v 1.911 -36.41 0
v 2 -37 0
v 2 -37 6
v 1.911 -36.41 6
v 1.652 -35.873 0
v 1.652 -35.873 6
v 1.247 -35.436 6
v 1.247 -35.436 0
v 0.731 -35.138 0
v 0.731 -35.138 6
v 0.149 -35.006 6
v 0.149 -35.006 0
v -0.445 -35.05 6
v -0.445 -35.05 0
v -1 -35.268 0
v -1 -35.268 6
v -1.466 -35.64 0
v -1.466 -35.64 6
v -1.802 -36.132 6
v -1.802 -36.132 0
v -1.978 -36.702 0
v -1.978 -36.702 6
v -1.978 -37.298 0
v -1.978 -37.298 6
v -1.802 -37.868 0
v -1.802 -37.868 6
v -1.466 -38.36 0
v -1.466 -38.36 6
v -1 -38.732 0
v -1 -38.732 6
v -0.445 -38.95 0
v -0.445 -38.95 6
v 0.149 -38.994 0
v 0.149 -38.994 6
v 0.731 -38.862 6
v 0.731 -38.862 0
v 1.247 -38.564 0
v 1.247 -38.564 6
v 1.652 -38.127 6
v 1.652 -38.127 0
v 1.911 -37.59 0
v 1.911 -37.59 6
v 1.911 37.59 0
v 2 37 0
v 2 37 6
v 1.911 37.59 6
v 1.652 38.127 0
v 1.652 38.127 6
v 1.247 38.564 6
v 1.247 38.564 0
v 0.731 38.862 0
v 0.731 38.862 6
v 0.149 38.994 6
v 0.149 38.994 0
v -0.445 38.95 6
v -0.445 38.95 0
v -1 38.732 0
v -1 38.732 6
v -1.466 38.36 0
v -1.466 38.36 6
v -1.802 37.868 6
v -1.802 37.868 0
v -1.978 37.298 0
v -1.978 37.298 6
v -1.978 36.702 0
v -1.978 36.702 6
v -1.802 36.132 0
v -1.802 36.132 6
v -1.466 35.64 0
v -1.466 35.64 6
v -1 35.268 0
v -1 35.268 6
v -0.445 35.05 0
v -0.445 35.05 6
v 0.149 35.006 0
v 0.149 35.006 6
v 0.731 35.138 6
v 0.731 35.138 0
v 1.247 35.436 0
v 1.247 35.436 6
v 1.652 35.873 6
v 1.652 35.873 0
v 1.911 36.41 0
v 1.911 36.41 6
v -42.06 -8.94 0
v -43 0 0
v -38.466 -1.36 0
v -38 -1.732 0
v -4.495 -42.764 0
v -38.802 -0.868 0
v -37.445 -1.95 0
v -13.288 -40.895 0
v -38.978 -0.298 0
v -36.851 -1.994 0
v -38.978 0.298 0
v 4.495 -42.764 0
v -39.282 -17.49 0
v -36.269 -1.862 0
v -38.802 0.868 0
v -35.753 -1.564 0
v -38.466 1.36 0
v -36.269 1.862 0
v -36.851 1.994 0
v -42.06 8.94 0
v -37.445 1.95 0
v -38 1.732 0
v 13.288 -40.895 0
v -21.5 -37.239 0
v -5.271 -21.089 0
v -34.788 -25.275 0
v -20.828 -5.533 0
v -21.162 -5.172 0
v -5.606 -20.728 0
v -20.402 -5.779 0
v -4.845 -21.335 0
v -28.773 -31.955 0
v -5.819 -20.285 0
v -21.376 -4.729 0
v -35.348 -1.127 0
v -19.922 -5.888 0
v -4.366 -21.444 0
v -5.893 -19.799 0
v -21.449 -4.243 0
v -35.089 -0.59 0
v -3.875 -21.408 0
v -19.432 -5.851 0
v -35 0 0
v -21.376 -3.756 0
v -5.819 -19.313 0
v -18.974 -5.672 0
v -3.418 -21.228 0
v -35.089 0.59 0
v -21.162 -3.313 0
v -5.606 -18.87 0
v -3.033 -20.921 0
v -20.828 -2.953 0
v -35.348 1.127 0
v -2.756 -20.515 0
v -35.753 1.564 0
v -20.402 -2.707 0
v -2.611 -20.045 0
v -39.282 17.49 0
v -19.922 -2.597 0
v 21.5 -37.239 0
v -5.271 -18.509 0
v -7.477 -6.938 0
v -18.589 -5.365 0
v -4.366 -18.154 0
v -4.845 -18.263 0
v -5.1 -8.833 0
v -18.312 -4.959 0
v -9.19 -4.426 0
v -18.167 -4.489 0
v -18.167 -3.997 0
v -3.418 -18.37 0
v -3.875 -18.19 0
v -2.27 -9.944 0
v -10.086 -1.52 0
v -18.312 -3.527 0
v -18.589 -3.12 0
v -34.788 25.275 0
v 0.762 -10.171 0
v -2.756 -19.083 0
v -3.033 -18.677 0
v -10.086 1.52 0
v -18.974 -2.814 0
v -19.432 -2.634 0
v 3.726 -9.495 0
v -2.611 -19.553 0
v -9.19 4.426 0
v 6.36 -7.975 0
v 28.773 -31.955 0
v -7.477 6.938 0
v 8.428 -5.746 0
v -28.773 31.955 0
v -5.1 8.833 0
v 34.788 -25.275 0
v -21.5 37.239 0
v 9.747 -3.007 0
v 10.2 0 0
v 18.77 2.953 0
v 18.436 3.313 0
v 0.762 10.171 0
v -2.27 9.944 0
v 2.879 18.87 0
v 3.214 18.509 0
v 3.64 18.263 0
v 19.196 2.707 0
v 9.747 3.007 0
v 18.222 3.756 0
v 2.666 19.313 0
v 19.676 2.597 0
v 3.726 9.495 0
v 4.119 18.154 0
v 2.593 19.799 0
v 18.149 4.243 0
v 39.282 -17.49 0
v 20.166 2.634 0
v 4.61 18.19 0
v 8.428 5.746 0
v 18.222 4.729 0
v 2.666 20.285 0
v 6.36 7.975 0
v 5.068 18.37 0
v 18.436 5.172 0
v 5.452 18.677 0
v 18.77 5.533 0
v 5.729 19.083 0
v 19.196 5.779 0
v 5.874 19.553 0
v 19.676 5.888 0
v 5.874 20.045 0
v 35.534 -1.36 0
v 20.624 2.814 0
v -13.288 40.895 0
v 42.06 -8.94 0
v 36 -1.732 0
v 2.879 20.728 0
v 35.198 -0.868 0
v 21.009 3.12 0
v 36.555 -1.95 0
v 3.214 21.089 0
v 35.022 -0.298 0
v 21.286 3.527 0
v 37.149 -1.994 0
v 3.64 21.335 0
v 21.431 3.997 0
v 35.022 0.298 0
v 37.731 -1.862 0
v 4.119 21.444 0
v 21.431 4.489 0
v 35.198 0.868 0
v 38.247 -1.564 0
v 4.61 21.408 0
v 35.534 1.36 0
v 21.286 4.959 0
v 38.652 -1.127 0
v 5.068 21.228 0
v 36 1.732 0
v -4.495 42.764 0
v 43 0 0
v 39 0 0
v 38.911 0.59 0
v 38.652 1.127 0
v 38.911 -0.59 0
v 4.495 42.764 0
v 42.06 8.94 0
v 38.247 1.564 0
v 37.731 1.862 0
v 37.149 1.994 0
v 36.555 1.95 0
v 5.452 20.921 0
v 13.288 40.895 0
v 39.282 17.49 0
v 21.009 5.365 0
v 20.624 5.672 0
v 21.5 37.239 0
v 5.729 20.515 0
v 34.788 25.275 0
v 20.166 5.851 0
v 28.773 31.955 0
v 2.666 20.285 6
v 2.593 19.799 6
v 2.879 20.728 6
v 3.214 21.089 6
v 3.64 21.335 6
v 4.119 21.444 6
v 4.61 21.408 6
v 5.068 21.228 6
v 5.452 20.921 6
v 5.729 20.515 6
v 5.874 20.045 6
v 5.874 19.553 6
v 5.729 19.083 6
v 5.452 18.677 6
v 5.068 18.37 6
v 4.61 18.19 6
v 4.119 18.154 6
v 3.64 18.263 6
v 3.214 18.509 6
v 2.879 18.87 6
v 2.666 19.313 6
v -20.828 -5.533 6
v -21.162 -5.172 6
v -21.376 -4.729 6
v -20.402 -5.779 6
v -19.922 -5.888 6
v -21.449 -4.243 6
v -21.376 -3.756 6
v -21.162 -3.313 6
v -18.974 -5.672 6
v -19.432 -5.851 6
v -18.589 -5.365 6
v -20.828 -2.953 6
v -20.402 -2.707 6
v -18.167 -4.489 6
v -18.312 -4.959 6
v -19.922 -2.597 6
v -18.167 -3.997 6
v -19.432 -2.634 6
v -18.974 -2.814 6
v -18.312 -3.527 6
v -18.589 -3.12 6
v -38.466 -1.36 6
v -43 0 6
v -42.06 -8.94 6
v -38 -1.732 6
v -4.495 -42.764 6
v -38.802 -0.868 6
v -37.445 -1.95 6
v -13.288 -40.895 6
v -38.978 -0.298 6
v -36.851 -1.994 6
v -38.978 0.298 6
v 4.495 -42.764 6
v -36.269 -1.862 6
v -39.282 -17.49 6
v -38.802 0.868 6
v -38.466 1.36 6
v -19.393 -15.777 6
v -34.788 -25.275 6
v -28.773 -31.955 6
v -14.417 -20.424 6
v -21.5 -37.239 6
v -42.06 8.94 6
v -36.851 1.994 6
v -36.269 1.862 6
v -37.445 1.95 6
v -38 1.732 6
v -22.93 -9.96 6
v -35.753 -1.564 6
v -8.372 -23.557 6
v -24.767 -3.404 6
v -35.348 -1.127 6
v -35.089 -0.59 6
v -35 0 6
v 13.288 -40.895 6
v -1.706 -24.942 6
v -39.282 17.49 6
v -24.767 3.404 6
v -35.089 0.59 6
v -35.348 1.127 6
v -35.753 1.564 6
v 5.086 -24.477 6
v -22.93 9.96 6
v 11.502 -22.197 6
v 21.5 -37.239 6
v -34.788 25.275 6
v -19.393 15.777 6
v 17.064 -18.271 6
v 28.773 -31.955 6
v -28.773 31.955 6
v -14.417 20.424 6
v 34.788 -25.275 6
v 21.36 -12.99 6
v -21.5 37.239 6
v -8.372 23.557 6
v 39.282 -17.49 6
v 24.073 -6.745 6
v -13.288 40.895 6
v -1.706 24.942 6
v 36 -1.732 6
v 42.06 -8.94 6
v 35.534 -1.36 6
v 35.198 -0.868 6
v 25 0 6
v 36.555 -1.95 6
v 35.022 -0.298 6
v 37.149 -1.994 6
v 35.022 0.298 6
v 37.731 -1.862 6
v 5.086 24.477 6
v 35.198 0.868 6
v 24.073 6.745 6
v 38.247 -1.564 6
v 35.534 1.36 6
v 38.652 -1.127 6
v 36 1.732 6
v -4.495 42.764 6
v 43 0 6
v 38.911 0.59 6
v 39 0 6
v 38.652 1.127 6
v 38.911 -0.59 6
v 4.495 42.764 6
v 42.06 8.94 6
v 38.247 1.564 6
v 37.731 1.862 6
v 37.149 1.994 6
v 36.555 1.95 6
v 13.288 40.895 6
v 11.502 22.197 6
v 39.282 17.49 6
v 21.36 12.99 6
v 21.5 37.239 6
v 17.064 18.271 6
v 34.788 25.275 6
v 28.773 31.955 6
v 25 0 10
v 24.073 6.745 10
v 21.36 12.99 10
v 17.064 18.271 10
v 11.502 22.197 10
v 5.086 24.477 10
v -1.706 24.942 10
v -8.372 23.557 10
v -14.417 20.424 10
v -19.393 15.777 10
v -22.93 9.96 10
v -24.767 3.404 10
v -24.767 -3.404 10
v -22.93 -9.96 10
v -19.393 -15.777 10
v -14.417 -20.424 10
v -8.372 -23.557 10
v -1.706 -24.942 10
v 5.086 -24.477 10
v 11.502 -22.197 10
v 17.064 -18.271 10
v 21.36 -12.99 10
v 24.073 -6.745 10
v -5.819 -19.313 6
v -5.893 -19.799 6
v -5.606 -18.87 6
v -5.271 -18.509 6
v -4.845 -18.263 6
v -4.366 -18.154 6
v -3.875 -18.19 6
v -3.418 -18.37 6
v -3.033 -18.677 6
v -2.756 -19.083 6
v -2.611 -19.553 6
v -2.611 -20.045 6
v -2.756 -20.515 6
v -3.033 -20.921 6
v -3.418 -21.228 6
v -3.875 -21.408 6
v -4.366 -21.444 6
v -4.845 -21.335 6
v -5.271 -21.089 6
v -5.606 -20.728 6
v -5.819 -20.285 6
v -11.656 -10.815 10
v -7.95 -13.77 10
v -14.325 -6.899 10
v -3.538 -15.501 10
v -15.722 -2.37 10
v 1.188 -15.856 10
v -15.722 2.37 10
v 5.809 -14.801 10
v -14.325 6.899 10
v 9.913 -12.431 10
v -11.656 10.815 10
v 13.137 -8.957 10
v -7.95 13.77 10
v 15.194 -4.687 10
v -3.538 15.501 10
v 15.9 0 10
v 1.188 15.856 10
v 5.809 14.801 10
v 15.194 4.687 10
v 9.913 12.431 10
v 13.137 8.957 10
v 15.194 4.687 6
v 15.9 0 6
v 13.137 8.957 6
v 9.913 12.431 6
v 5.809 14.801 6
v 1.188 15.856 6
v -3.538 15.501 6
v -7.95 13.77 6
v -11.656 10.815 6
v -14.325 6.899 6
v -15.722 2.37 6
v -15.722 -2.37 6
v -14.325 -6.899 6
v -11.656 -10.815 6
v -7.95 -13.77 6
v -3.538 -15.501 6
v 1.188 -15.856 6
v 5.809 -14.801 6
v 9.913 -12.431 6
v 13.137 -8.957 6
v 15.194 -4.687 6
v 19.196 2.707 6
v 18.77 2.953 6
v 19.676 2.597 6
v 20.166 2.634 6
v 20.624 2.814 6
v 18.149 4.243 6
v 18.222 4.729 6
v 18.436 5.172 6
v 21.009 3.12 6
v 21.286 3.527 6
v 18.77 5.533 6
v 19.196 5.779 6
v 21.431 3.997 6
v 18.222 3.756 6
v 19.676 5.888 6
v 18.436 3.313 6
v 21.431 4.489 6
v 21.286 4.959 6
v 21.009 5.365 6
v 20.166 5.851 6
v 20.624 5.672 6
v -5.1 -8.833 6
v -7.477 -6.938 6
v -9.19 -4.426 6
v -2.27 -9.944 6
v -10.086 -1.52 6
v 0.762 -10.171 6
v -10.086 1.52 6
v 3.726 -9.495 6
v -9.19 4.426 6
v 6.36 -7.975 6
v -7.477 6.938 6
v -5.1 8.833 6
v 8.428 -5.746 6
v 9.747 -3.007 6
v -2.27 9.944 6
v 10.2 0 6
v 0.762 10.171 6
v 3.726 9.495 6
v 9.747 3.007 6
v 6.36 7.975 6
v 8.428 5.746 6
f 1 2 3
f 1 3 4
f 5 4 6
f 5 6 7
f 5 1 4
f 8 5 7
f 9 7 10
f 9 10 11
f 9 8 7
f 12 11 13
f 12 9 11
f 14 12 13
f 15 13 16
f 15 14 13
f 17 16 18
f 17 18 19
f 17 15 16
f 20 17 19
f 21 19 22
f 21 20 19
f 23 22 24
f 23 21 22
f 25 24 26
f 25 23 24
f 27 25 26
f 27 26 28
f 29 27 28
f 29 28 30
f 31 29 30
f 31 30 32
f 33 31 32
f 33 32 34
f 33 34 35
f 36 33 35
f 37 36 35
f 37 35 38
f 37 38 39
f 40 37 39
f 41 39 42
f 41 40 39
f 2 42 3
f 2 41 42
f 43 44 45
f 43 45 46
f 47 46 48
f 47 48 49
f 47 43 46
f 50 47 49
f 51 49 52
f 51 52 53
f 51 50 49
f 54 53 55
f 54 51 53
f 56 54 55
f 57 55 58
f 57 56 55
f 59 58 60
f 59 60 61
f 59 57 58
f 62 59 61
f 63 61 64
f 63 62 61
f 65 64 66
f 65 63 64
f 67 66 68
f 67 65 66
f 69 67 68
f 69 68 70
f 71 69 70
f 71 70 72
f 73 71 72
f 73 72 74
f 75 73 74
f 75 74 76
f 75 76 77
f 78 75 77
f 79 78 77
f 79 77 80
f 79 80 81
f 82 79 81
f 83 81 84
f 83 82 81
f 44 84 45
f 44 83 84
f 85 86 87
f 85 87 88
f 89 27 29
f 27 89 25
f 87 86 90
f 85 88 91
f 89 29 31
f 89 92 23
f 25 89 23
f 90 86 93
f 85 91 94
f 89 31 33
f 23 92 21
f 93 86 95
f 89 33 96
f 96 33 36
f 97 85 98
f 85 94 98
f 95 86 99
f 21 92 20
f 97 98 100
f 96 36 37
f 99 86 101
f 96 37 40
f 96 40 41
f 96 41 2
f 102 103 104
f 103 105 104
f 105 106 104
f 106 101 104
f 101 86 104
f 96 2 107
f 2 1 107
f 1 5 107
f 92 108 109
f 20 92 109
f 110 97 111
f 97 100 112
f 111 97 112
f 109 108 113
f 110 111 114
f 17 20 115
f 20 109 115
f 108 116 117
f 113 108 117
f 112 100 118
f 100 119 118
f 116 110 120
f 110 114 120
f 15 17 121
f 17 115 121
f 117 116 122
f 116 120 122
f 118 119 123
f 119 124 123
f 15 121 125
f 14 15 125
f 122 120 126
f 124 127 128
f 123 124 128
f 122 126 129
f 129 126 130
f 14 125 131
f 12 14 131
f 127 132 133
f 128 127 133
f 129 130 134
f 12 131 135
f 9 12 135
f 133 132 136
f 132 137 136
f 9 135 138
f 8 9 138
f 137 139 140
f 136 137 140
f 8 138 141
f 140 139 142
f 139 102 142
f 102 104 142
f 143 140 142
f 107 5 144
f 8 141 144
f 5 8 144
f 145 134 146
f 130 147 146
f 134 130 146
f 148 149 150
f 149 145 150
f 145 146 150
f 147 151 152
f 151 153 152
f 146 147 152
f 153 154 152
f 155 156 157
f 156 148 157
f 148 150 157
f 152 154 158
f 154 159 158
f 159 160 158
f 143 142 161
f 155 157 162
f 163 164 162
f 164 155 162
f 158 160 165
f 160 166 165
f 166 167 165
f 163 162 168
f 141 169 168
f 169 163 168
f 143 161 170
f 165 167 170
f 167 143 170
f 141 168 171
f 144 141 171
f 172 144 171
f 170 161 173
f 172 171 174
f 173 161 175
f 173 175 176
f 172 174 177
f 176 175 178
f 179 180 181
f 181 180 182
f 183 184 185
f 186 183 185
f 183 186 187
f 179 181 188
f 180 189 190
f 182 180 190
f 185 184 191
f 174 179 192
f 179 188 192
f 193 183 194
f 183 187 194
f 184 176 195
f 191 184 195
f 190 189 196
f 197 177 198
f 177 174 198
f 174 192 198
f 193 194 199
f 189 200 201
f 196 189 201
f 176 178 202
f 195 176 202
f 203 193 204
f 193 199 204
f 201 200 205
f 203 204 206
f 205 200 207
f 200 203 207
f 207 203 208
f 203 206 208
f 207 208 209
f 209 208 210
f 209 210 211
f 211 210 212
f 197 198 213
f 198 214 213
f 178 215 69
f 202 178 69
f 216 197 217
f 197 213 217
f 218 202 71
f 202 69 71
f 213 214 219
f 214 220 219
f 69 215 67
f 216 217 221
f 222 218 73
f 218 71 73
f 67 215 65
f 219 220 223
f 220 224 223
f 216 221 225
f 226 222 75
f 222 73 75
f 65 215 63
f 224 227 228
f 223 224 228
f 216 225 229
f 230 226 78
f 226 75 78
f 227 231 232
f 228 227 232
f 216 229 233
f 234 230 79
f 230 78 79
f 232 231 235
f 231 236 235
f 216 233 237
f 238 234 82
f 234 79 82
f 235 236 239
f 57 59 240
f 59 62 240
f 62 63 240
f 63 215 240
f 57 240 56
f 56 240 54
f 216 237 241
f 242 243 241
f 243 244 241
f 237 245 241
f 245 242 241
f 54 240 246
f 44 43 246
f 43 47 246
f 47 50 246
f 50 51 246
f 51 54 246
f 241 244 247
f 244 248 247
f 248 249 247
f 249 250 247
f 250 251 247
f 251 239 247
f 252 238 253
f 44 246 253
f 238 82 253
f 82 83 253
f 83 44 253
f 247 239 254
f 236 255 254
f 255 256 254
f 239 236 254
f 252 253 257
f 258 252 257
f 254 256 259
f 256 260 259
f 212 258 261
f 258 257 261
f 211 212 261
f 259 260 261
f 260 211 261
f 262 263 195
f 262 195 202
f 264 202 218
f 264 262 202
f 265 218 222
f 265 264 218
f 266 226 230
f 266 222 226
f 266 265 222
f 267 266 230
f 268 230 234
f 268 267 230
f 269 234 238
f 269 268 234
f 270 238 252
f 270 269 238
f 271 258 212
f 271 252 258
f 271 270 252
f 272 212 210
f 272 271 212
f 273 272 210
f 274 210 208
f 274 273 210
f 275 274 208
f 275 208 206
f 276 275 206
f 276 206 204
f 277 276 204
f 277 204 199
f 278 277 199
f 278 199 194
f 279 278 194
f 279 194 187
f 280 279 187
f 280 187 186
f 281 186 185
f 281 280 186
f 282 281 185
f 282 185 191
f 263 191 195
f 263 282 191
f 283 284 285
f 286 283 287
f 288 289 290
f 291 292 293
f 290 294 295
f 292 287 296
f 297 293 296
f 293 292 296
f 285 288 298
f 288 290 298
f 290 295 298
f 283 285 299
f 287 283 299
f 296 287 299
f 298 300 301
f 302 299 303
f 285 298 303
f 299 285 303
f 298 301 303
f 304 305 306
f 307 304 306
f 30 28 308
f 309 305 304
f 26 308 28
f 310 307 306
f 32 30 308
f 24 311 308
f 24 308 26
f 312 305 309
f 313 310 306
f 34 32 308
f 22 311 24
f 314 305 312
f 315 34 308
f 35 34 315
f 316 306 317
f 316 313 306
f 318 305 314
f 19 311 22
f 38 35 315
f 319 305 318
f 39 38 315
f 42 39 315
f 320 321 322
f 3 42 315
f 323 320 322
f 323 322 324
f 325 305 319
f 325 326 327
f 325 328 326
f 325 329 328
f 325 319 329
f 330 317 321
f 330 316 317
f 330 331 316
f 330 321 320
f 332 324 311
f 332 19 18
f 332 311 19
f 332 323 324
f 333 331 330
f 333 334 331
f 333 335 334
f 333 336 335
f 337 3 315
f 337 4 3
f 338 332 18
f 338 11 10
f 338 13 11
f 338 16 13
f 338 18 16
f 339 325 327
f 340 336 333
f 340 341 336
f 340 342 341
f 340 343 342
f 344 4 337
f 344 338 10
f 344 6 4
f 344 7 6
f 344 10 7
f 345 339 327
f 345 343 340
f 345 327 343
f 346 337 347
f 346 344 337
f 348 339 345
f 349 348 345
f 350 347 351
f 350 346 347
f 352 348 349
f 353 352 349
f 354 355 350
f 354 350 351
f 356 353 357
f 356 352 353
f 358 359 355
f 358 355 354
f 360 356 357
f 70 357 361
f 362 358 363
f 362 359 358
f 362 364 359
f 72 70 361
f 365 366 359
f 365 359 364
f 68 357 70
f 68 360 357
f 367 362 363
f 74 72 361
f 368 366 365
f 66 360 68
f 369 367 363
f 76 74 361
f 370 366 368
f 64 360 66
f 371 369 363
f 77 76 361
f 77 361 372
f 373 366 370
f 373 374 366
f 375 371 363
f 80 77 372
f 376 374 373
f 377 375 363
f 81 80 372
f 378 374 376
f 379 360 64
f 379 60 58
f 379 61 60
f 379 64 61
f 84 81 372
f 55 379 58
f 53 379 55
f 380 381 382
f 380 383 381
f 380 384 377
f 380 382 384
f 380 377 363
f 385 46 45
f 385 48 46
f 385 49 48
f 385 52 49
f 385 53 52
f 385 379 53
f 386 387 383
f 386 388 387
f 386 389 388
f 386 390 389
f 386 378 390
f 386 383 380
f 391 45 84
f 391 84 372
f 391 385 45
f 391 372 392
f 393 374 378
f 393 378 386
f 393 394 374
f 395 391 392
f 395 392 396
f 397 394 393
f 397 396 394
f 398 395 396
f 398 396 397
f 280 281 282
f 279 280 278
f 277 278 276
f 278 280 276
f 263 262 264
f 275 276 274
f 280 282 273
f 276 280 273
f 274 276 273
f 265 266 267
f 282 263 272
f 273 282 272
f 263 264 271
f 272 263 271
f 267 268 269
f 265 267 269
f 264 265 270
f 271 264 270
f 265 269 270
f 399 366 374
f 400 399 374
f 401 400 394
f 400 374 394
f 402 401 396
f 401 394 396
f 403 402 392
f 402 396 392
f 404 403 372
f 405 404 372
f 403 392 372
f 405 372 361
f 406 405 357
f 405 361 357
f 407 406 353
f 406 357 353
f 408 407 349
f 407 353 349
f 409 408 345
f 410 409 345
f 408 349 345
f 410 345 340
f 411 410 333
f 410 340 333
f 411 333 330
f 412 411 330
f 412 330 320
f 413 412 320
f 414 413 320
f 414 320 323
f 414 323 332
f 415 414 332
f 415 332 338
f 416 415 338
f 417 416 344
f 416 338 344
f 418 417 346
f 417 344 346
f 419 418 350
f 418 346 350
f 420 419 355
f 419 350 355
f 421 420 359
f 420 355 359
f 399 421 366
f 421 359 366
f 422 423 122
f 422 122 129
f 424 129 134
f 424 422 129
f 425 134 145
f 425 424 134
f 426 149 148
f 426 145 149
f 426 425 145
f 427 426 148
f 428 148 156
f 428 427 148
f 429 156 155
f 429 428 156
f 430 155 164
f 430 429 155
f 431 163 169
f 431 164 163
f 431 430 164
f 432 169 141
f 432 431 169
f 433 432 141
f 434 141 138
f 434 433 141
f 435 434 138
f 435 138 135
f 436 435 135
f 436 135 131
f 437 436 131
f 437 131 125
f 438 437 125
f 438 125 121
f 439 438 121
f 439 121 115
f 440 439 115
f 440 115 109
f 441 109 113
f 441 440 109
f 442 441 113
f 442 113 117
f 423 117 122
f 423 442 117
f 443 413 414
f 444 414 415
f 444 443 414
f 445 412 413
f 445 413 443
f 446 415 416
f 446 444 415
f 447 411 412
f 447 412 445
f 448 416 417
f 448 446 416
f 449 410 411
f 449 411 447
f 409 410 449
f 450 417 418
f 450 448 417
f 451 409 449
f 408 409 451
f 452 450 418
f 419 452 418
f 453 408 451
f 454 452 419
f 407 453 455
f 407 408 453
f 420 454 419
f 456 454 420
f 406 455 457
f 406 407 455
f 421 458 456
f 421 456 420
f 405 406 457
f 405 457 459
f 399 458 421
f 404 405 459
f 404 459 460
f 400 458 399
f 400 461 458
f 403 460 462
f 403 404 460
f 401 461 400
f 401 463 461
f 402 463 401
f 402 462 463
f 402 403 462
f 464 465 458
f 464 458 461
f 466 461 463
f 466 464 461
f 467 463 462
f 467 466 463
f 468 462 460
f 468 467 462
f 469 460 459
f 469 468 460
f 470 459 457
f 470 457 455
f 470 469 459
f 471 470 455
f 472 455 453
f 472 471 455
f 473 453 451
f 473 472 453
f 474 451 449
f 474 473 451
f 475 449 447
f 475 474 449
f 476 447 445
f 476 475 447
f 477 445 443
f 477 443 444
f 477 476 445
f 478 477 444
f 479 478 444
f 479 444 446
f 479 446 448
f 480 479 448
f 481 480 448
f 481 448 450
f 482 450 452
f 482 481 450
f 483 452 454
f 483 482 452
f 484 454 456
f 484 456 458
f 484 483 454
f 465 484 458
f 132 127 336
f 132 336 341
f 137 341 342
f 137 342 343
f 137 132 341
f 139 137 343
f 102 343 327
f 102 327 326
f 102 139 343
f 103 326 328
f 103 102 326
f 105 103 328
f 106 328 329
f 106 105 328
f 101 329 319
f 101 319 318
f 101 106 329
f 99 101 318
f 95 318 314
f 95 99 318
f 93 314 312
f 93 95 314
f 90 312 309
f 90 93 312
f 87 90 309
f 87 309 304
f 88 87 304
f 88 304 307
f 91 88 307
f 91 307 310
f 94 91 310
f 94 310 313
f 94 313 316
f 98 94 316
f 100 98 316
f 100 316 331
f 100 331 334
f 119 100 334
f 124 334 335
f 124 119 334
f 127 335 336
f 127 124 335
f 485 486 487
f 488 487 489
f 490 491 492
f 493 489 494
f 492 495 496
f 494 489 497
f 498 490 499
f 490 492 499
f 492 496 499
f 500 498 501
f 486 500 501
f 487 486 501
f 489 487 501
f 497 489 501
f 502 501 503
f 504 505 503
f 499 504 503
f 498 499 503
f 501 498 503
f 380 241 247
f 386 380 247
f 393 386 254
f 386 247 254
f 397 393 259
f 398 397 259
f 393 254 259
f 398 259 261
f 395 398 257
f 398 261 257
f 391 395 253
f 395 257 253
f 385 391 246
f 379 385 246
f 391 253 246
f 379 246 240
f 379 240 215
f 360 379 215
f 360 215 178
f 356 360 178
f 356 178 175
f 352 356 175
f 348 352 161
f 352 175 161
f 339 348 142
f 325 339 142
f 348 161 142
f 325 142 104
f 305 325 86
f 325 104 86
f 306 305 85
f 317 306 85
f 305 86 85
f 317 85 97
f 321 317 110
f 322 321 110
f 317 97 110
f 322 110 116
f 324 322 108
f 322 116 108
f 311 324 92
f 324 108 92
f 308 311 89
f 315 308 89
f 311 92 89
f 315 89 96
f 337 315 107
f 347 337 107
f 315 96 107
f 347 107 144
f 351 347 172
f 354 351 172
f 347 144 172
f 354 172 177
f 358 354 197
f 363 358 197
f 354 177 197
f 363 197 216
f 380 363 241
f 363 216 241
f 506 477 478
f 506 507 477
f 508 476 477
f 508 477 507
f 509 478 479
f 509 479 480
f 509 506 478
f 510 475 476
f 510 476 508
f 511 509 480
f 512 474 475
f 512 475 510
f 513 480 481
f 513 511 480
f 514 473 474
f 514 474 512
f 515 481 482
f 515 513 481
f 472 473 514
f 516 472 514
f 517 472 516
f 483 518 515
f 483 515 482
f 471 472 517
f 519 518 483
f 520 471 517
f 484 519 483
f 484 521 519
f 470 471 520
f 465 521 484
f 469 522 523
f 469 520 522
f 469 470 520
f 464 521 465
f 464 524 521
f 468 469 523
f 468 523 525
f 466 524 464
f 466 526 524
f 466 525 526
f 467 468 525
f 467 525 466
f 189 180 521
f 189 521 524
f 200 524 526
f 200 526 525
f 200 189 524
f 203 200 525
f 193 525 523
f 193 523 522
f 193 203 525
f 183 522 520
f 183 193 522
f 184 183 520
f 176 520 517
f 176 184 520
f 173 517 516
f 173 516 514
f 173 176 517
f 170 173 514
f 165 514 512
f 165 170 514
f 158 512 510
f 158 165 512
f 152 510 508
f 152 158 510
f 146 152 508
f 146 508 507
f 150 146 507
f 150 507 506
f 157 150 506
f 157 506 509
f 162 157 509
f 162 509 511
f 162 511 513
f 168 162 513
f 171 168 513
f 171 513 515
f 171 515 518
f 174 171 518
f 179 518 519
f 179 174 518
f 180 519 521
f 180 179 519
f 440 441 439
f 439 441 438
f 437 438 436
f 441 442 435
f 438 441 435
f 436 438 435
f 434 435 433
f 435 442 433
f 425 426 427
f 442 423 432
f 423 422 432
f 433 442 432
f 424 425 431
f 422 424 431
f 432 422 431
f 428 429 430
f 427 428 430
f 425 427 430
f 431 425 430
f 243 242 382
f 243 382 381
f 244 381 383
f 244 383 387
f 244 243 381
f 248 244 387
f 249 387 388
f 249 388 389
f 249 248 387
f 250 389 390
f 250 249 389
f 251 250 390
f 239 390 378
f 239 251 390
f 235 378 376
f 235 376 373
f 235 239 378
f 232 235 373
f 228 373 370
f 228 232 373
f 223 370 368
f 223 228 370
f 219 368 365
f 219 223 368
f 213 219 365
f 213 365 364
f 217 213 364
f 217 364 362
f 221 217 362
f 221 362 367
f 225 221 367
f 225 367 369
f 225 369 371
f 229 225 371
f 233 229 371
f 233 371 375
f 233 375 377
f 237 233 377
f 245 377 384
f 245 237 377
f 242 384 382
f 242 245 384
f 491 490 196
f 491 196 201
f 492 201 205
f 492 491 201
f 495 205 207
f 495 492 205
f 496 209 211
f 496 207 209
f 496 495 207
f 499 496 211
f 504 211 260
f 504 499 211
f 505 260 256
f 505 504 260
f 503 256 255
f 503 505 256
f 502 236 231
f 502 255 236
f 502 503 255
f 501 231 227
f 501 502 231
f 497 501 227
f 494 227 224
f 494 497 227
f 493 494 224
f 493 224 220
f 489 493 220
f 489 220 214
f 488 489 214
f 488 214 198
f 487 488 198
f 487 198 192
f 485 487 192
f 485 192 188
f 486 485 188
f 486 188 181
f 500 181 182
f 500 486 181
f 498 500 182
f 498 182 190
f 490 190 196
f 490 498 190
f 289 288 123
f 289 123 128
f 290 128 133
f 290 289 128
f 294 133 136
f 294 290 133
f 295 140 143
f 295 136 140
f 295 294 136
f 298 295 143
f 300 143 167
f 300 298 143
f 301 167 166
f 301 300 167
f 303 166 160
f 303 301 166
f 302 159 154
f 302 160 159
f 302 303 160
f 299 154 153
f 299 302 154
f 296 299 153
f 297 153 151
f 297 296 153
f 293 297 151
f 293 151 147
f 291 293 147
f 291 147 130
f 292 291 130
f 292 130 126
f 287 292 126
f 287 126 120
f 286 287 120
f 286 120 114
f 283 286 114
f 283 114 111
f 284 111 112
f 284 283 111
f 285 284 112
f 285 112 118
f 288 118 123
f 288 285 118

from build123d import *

# Parameters (mm, degrees)
SKETCH_1_R               = 41.5
SKETCH_1_R_2             = 2
SKETCH_1_R_3             = 10.2
EXTRUDE_1_DEPTH          = 6
CUT_EXTRUDE_1_DEPTH      = 59.99576256
CUT_EXTRUDE_1_DEPTH_BACK = 59.99576256
SKETCH_4_R               = 1.65
SKETCH_3_R               = 25
SKETCH_3_R_2             = 15.9
EXTRUDE_2_DEPTH          = 4
EXTRUDE_START            = -6
SKETCH_5_R               = 43
SKETCH_5_R_2             = 41.5
EXTRUDE_4_DEPTH          = 6


with BuildPart() as part:
    # 草图1 → 凸台-拉伸1 (new body)
    with BuildSketch(Plane.XY):
        Circle(SKETCH_1_R)
        with Locations((0, -37)):
            Circle(SKETCH_1_R_2, mode=Mode.SUBTRACT)
        with Locations((-37, 0)):
            Circle(SKETCH_1_R_2, mode=Mode.SUBTRACT)
        with Locations((0, 37)):
            Circle(SKETCH_1_R_2, mode=Mode.SUBTRACT)
        with Locations((37, 0)):
            Circle(SKETCH_1_R_2, mode=Mode.SUBTRACT)
        Circle(SKETCH_1_R_3, mode=Mode.SUBTRACT)
    extrude(amount=EXTRUDE_1_DEPTH)

    # 草图4 → 切除-拉伸1 (cut, two sides: drawn at the far end of the back side and taken through both)
    with BuildSketch(Plane(origin=(0, 0, 0), x_dir=(-1, 0, 0), z_dir=(0, 0, -1)).offset(-CUT_EXTRUDE_1_DEPTH_BACK)):
        with Locations((-19.798989873, 4.242640687)):
            Circle(SKETCH_4_R)
        with Locations((-4.242640687, 19.798989873)):
            Circle(SKETCH_4_R)
        with Locations((19.798989873, -4.242640687)):
            Circle(SKETCH_4_R)
        with Locations((4.242640687, -19.798989873)):
            Circle(SKETCH_4_R)
    extrude(amount=CUT_EXTRUDE_1_DEPTH + CUT_EXTRUDE_1_DEPTH_BACK, mode=Mode.SUBTRACT)

    # 草图3 → 凸台-拉伸2 (add)
    with BuildSketch(Plane.XY.offset(6)):
        Circle(SKETCH_3_R)
        Circle(SKETCH_3_R_2, mode=Mode.SUBTRACT)
    extrude(amount=EXTRUDE_2_DEPTH)

    # 草图5 → 凸台-拉伸4 (add)
    with BuildSketch(Plane.XY.offset(6).offset(EXTRUDE_START)):
        Circle(SKETCH_5_R)
        Circle(SKETCH_5_R_2, mode=Mode.SUBTRACT)
    extrude(amount=EXTRUDE_4_DEPTH)


solid = part.part
